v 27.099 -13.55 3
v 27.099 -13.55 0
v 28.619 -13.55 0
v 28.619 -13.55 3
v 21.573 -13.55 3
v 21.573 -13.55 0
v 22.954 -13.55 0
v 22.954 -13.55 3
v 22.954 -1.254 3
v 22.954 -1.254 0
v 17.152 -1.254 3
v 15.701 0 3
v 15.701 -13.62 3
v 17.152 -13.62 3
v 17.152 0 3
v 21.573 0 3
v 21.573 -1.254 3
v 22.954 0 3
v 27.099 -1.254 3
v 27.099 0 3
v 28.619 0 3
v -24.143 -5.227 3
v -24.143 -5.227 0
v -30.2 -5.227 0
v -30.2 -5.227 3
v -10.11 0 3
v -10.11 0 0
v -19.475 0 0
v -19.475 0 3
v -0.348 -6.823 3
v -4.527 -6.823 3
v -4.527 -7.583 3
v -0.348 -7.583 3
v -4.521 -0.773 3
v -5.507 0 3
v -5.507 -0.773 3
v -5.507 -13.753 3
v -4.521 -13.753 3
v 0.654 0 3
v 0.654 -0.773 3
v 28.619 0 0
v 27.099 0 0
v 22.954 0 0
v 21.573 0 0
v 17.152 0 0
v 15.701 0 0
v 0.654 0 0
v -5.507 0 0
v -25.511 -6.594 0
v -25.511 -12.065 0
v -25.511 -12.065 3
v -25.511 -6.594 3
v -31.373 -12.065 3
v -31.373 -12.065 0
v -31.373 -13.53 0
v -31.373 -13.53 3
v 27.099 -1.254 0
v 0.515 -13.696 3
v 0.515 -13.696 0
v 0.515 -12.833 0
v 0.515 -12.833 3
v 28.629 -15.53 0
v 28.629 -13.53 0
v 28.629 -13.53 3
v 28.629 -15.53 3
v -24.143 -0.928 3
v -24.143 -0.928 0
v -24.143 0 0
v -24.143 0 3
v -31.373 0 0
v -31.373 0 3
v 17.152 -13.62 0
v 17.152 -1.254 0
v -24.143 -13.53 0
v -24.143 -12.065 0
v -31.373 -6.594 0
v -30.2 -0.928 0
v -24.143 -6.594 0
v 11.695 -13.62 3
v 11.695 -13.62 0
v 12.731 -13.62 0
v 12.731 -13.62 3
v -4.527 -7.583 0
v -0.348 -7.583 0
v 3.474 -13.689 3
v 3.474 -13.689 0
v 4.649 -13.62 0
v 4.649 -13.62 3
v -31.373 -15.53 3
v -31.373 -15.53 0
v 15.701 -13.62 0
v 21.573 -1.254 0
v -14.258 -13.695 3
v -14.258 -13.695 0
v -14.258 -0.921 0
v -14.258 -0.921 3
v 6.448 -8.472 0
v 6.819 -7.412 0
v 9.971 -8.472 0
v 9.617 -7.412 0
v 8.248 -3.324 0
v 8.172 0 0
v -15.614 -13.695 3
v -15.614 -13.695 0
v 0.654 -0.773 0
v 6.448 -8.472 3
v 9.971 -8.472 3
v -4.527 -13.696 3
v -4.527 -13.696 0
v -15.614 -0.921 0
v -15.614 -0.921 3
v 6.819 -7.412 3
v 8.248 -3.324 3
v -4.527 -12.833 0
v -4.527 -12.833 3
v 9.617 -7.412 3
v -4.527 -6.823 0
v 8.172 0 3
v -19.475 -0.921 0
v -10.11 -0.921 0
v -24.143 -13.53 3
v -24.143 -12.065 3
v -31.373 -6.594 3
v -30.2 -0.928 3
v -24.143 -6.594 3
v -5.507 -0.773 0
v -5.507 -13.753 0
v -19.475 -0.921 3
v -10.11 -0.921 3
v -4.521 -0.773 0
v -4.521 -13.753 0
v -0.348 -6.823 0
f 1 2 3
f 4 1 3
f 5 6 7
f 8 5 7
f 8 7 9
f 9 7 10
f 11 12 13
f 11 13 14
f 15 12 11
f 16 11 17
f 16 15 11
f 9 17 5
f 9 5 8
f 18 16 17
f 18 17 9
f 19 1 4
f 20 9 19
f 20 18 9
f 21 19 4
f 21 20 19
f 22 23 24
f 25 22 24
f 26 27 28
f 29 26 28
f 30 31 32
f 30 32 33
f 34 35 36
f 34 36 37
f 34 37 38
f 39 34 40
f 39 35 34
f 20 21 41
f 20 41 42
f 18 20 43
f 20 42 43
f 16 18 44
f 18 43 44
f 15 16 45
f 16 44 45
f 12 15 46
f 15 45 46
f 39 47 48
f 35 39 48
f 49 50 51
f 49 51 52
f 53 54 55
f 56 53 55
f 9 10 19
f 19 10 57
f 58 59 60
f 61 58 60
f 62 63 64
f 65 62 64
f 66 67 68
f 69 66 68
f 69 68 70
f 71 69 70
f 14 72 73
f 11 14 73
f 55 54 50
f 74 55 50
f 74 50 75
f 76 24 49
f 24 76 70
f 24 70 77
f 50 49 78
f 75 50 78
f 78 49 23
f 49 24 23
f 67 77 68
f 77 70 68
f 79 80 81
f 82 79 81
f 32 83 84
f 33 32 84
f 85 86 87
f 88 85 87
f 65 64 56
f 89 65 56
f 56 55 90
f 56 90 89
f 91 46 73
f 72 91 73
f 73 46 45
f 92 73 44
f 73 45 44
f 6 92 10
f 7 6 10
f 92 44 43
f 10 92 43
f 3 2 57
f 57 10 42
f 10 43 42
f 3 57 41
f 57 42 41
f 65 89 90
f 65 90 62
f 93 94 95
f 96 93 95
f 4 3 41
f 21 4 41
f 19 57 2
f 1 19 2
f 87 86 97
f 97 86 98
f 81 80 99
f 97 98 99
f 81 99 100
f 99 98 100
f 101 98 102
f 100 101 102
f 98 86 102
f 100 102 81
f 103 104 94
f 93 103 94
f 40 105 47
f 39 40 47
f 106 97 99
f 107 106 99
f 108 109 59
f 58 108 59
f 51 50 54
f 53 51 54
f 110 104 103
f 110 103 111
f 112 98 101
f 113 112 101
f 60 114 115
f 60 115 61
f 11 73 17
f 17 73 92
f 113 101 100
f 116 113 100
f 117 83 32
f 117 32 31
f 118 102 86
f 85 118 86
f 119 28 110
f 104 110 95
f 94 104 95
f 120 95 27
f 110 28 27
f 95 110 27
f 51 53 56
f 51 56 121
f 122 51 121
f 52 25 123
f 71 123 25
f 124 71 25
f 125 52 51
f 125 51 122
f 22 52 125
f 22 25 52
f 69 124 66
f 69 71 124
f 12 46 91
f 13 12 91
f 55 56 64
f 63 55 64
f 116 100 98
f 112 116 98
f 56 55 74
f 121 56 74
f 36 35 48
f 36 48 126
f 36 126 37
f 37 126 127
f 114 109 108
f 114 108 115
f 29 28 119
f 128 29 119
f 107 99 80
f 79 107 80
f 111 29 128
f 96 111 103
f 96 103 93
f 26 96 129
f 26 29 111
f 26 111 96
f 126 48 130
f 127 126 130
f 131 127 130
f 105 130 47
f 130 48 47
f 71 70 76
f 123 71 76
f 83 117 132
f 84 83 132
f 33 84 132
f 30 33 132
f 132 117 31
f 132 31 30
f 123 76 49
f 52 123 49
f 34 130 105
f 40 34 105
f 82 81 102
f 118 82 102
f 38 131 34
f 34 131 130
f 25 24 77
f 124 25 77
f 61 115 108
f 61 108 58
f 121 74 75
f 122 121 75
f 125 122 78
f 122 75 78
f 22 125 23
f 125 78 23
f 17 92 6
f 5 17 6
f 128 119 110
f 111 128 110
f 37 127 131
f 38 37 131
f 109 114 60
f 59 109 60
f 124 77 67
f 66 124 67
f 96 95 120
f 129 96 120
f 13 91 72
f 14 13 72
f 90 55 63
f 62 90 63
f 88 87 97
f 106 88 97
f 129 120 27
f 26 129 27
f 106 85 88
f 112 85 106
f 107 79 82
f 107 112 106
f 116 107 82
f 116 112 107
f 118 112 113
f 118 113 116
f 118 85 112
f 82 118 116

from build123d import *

# Parameters (mm, degrees)
F0_W     = 1.1723097414
F0_H     = 4.2984655011
F0_W_2   = 1.367693767
F0_H_2   = 5.4707736708
F6_DEPTH = 3
F1_W     = 1.3554608449
F1_H     = 12.7741967444
F2_W     = 0.9857905097
F2_H     = 12.9795701359
F3_W     = 4.1792763222
F3_H     = 0.7598684169
F3_W_2   = 5.0427630194
F3_H_2   = 0.8634869009
F5_W     = 4.4210534543
F5_H     = 1.2543828925
F5_W_2   = 4.1447356343
F7_W     = 52.7724102139
F7_H     = 3
F7_W_2   = 7.2292368859
F8_DEPTH = 2


with BuildPart() as f6:
    # F0 (on Top) → F6 (new body)
    with BuildSketch(Plane.XY):
        Polygon((-24.1432655603, 0), (-31.3725024462, 0), (-31.3725024462, -0.9280753438), (-30.2001927048, -0.9280753438), (-24.1432655603, -0.9280753438), align=None)
        with Locations((-30.7863475755, -3.0773080944)):
            Rectangle(F0_W, F0_H)
        Polygon((-30.2001927048, -5.2265408449), (-31.3725024462, -5.2265408449), (-31.3725024462, -6.5942336805), (-25.5109593272, -6.5942336805), (-24.1432655603, -6.5942336805), (-24.1432655603, -5.2265408449), align=None)
        with Locations((-24.8271124437, -9.3296205159)):
            Rectangle(F0_W_2, F0_H_2)
        Polygon((-24.1432655603, -12.0650073513), (-25.5109593272, -12.0650073513), (-31.3725024462, -12.0650073513), (-31.3725024462, -13.5303931311), (-24.1432655603, -13.5303931311), align=None)
    extrude(amount=F6_DEPTH)


with BuildPart() as f6b:
    # F1 (on Top) → F6, piece 2 (new body)
    with BuildSketch(Plane.XY):
        with Locations((-14.935886953, -7.3080103321)):
            Rectangle(F1_W, F1_H)
        Polygon((-10.1096229628, 0), (-19.4746293128, 0), (-19.4746293128, -0.9209119598), (-15.6136173755, -0.9209119598), (-14.2581565306, -0.9209119598), (-10.1096229628, -0.9209119598), align=None)
    extrude(amount=F6_DEPTH)


with BuildPart() as f6c:
    # F2 (on Top) → F6, piece 3 (new body)
    with BuildSketch(Plane.XY):
        Polygon((0.6540161557, -0.7731203805), (0.6540161557, 0), (-5.507172551, 0), (-5.507172551, -0.7731203805), (-4.5213820413, -0.7731203805), align=None)
        with Locations((-5.0142772961, -7.2629054484)):
            Rectangle(F2_W, F2_H)
    extrude(amount=F6_DEPTH)


with BuildPart() as f6d:
    # F3 (on Top) → F6, piece 4 (new body)
    with BuildSketch(Plane.XY):
        with Locations((-2.4377993395, -7.2027209681)):
            Rectangle(F3_W, F3_H)
    extrude(amount=F6_DEPTH)


with BuildPart() as f6e:
    # F3 (on Top) → F6, piece 5 (new body)
    with BuildSketch(Plane.XY):
        with Locations((-2.0060559909, -13.2643990219)):
            Rectangle(F3_W_2, F3_H_2)
    extrude(amount=F6_DEPTH)


with BuildPart() as f6f:
    # F4 (on Top) → F6, piece 6 (new body)
    with BuildSketch(Plane.XY):
        Polygon((8.1715472043, 0), (3.474178724, -13.6885941029), (4.6485206112, -13.6195151135), (6.4483432596, -8.471871454), (6.818751279, -7.4124734659), (8.248165908, -3.3242277944), (9.616729785, -7.4124734659), (9.971369387, -8.471871454), (11.694572866, -13.6195151135), (12.7307586372, -13.6195151135), align=None)
        Polygon((6.818751279, -7.4124734659), (6.4483432596, -8.471871454), (9.971369387, -8.471871454), (9.616729785, -7.4124734659), align=None)
    extrude(amount=F6_DEPTH)


with BuildPart() as f6g:
    # F5 (on Top) → F6, piece 7 (new body)
    with BuildSketch(Plane.XY):
        Polygon((15.7011523843, 0), (15.7011523843, -13.6195151135), (17.1518102288, -13.6195151135), (17.1518102288, -1.2543828925), (17.1518102288, 0), align=None)
        with Locations((19.362336956, -0.6271914463)):
            Rectangle(F5_W, F5_H)
        with Locations((25.0268094242, -0.6271914463)):
            Rectangle(F5_W_2, F5_H)
        Polygon((28.6189168692, 0), (27.0991772413, 0), (27.0991772413, -1.2543828925), (27.0991772413, -13.5504361242), (28.6189168692, -13.5504361242), align=None)
        Polygon((21.5728636831, 0), (21.5728636831, -1.2543828925), (21.5728636831, -13.5504361242), (22.954441607, -13.5504361242), (22.954441607, -1.2543828925), (22.954441607, 0), align=None)
    extrude(amount=F6_DEPTH)


with BuildPart() as f8:
    # F7 (on face) → F8 (new body)
    with BuildSketch(Plane.XZ.offset(13.5303931311)):
        with Locations((2.2429395467, 1.5)):
            Rectangle(F7_W, F7_H)
        with Locations((-27.7578840032, 1.5)):
            Rectangle(F7_W_2, F7_H)
    extrude(amount=F8_DEPTH)


solid = Compound([f6.part, f6b.part, f6c.part, f6d.part, f6e.part, f6f.part, f6g.part, f8.part])
